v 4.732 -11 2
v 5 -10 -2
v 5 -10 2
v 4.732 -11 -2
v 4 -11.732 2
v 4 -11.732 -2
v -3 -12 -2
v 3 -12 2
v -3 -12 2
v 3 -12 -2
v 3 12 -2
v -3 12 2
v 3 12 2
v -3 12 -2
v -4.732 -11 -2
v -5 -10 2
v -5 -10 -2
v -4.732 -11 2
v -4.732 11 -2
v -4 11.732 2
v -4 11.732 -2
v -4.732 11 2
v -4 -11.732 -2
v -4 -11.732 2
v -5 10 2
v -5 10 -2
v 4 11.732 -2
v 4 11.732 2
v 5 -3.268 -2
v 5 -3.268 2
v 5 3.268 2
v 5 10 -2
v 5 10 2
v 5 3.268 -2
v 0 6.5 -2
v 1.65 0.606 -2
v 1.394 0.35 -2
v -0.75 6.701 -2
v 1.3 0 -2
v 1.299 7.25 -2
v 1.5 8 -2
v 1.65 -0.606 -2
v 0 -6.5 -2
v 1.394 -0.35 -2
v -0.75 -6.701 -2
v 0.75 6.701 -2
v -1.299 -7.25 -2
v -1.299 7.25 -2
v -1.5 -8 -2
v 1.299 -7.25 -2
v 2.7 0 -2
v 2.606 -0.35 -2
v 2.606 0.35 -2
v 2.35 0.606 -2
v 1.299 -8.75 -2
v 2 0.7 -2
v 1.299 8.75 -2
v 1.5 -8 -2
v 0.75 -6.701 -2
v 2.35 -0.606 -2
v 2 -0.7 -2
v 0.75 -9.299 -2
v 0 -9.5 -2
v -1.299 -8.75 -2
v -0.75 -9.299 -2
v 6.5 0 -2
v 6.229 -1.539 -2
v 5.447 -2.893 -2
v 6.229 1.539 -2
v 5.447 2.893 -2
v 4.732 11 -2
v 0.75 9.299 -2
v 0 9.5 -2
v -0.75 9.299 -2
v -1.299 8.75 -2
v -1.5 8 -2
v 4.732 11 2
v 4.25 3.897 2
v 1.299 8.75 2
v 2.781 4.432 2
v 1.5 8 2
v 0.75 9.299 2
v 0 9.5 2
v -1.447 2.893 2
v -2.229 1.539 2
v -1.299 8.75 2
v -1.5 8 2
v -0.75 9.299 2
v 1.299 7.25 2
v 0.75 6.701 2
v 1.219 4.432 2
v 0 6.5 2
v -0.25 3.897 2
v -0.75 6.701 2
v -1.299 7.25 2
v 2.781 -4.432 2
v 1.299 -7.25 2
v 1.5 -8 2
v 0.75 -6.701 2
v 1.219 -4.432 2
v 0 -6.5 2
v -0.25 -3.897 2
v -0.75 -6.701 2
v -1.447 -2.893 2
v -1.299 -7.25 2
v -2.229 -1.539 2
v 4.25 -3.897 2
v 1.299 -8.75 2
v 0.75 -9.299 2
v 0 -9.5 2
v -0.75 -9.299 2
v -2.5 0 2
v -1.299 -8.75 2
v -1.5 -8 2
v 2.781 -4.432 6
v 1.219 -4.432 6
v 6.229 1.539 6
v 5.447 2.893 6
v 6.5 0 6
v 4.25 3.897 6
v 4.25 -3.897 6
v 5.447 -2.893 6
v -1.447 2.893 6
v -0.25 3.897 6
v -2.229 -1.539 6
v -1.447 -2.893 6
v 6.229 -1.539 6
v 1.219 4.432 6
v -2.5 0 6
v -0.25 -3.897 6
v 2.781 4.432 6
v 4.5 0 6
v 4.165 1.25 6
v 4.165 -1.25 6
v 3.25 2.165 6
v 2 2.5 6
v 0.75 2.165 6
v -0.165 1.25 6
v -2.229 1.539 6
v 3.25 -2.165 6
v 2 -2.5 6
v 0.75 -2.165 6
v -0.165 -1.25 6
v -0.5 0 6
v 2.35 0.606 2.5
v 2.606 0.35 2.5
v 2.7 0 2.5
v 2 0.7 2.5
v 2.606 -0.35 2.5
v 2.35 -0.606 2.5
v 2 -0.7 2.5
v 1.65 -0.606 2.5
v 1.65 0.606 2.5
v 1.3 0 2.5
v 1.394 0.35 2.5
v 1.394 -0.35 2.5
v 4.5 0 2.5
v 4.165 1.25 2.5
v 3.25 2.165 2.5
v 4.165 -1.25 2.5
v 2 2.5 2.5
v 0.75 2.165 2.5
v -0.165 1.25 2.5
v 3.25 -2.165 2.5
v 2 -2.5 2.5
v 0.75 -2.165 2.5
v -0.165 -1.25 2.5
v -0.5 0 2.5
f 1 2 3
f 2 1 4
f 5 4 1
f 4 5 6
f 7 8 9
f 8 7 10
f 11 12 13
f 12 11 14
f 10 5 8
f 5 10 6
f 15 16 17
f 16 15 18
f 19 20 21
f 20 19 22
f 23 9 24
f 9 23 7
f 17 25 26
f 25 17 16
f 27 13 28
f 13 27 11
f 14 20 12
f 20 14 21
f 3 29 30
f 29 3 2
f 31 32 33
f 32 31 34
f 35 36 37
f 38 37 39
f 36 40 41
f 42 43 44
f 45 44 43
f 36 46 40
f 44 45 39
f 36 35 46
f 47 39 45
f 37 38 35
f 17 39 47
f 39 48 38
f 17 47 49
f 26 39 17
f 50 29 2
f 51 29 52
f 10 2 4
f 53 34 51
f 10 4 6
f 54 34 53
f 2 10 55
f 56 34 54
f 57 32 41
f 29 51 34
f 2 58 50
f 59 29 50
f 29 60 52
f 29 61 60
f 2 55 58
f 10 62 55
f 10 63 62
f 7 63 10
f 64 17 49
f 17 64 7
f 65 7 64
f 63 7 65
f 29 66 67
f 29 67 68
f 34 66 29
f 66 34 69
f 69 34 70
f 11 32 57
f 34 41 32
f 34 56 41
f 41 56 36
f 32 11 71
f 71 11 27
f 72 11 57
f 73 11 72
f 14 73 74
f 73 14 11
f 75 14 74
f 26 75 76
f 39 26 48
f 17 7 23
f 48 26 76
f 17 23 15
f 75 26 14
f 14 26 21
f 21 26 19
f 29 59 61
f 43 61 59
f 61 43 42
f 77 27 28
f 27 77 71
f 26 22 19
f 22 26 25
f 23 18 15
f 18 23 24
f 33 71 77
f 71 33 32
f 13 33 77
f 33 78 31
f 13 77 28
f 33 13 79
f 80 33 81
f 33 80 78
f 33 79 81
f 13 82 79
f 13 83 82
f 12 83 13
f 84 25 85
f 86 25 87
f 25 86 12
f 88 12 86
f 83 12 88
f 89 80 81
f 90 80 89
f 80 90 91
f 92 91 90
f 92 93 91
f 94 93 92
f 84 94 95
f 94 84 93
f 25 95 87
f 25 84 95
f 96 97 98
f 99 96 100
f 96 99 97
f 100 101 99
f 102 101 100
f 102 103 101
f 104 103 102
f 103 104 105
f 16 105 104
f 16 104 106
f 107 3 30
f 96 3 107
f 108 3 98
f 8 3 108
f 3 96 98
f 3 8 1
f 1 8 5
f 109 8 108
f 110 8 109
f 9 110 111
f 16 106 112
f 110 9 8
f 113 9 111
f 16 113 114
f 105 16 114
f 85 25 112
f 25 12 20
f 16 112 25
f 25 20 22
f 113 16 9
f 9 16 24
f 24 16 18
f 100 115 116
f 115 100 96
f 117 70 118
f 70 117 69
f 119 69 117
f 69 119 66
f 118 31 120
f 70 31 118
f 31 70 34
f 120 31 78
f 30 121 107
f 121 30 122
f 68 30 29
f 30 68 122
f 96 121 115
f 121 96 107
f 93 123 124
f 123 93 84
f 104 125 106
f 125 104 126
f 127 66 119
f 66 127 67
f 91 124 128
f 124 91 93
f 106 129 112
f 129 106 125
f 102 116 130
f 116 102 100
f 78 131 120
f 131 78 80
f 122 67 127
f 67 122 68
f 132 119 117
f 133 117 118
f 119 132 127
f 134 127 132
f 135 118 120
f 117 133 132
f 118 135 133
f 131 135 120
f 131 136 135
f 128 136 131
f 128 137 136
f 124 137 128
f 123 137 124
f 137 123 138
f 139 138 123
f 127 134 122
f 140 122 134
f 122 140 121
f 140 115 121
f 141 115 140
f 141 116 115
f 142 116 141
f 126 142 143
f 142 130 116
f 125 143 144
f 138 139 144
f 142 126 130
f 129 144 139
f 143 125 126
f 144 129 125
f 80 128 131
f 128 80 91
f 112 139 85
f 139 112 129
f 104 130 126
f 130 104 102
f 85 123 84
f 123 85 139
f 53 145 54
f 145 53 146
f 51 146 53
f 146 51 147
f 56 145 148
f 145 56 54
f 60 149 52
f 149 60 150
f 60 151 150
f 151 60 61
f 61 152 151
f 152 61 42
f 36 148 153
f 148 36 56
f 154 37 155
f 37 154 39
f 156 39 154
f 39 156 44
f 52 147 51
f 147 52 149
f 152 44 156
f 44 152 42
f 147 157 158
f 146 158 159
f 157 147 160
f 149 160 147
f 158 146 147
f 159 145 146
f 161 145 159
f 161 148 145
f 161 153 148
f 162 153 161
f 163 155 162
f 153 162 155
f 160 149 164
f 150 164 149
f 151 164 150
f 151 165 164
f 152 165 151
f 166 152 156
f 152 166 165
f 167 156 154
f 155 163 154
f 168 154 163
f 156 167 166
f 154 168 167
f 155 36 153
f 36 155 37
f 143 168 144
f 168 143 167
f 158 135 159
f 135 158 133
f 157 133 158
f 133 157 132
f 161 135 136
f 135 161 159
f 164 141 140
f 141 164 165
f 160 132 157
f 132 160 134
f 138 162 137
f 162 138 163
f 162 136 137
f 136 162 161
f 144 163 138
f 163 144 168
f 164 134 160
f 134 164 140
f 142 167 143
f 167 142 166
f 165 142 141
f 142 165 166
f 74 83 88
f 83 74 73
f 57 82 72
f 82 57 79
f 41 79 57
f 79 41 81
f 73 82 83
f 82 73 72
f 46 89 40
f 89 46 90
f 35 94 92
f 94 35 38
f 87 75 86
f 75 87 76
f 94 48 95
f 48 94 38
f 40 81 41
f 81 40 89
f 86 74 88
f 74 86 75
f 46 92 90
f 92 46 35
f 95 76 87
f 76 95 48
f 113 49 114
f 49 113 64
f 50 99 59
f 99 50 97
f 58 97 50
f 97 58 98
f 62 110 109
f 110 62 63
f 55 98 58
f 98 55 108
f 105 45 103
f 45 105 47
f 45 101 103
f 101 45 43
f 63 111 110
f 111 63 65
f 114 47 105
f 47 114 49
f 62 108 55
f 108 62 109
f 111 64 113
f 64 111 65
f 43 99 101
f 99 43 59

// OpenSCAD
$fn=12;

difference() {
  union () {
    minkowski() {
      cube([6, 20, 2], center=true);
      cylinder(r=2, h=2, center=true); 
    }
    translate([2,0,2]) cylinder(r=4.5, h=8, center=true, $fn=18);
  }
  translate([2,0,0]) cylinder(r=.7, h=5, center=true);
  translate([2,0,5]) cylinder(r=2.5, h=5, center=true);
  translate([0,8,0]) cylinder(r=1.5, h=8, center=true); 
  translate([0,-8,0]) cylinder(r=1.5, h=8, center=true); 
}
